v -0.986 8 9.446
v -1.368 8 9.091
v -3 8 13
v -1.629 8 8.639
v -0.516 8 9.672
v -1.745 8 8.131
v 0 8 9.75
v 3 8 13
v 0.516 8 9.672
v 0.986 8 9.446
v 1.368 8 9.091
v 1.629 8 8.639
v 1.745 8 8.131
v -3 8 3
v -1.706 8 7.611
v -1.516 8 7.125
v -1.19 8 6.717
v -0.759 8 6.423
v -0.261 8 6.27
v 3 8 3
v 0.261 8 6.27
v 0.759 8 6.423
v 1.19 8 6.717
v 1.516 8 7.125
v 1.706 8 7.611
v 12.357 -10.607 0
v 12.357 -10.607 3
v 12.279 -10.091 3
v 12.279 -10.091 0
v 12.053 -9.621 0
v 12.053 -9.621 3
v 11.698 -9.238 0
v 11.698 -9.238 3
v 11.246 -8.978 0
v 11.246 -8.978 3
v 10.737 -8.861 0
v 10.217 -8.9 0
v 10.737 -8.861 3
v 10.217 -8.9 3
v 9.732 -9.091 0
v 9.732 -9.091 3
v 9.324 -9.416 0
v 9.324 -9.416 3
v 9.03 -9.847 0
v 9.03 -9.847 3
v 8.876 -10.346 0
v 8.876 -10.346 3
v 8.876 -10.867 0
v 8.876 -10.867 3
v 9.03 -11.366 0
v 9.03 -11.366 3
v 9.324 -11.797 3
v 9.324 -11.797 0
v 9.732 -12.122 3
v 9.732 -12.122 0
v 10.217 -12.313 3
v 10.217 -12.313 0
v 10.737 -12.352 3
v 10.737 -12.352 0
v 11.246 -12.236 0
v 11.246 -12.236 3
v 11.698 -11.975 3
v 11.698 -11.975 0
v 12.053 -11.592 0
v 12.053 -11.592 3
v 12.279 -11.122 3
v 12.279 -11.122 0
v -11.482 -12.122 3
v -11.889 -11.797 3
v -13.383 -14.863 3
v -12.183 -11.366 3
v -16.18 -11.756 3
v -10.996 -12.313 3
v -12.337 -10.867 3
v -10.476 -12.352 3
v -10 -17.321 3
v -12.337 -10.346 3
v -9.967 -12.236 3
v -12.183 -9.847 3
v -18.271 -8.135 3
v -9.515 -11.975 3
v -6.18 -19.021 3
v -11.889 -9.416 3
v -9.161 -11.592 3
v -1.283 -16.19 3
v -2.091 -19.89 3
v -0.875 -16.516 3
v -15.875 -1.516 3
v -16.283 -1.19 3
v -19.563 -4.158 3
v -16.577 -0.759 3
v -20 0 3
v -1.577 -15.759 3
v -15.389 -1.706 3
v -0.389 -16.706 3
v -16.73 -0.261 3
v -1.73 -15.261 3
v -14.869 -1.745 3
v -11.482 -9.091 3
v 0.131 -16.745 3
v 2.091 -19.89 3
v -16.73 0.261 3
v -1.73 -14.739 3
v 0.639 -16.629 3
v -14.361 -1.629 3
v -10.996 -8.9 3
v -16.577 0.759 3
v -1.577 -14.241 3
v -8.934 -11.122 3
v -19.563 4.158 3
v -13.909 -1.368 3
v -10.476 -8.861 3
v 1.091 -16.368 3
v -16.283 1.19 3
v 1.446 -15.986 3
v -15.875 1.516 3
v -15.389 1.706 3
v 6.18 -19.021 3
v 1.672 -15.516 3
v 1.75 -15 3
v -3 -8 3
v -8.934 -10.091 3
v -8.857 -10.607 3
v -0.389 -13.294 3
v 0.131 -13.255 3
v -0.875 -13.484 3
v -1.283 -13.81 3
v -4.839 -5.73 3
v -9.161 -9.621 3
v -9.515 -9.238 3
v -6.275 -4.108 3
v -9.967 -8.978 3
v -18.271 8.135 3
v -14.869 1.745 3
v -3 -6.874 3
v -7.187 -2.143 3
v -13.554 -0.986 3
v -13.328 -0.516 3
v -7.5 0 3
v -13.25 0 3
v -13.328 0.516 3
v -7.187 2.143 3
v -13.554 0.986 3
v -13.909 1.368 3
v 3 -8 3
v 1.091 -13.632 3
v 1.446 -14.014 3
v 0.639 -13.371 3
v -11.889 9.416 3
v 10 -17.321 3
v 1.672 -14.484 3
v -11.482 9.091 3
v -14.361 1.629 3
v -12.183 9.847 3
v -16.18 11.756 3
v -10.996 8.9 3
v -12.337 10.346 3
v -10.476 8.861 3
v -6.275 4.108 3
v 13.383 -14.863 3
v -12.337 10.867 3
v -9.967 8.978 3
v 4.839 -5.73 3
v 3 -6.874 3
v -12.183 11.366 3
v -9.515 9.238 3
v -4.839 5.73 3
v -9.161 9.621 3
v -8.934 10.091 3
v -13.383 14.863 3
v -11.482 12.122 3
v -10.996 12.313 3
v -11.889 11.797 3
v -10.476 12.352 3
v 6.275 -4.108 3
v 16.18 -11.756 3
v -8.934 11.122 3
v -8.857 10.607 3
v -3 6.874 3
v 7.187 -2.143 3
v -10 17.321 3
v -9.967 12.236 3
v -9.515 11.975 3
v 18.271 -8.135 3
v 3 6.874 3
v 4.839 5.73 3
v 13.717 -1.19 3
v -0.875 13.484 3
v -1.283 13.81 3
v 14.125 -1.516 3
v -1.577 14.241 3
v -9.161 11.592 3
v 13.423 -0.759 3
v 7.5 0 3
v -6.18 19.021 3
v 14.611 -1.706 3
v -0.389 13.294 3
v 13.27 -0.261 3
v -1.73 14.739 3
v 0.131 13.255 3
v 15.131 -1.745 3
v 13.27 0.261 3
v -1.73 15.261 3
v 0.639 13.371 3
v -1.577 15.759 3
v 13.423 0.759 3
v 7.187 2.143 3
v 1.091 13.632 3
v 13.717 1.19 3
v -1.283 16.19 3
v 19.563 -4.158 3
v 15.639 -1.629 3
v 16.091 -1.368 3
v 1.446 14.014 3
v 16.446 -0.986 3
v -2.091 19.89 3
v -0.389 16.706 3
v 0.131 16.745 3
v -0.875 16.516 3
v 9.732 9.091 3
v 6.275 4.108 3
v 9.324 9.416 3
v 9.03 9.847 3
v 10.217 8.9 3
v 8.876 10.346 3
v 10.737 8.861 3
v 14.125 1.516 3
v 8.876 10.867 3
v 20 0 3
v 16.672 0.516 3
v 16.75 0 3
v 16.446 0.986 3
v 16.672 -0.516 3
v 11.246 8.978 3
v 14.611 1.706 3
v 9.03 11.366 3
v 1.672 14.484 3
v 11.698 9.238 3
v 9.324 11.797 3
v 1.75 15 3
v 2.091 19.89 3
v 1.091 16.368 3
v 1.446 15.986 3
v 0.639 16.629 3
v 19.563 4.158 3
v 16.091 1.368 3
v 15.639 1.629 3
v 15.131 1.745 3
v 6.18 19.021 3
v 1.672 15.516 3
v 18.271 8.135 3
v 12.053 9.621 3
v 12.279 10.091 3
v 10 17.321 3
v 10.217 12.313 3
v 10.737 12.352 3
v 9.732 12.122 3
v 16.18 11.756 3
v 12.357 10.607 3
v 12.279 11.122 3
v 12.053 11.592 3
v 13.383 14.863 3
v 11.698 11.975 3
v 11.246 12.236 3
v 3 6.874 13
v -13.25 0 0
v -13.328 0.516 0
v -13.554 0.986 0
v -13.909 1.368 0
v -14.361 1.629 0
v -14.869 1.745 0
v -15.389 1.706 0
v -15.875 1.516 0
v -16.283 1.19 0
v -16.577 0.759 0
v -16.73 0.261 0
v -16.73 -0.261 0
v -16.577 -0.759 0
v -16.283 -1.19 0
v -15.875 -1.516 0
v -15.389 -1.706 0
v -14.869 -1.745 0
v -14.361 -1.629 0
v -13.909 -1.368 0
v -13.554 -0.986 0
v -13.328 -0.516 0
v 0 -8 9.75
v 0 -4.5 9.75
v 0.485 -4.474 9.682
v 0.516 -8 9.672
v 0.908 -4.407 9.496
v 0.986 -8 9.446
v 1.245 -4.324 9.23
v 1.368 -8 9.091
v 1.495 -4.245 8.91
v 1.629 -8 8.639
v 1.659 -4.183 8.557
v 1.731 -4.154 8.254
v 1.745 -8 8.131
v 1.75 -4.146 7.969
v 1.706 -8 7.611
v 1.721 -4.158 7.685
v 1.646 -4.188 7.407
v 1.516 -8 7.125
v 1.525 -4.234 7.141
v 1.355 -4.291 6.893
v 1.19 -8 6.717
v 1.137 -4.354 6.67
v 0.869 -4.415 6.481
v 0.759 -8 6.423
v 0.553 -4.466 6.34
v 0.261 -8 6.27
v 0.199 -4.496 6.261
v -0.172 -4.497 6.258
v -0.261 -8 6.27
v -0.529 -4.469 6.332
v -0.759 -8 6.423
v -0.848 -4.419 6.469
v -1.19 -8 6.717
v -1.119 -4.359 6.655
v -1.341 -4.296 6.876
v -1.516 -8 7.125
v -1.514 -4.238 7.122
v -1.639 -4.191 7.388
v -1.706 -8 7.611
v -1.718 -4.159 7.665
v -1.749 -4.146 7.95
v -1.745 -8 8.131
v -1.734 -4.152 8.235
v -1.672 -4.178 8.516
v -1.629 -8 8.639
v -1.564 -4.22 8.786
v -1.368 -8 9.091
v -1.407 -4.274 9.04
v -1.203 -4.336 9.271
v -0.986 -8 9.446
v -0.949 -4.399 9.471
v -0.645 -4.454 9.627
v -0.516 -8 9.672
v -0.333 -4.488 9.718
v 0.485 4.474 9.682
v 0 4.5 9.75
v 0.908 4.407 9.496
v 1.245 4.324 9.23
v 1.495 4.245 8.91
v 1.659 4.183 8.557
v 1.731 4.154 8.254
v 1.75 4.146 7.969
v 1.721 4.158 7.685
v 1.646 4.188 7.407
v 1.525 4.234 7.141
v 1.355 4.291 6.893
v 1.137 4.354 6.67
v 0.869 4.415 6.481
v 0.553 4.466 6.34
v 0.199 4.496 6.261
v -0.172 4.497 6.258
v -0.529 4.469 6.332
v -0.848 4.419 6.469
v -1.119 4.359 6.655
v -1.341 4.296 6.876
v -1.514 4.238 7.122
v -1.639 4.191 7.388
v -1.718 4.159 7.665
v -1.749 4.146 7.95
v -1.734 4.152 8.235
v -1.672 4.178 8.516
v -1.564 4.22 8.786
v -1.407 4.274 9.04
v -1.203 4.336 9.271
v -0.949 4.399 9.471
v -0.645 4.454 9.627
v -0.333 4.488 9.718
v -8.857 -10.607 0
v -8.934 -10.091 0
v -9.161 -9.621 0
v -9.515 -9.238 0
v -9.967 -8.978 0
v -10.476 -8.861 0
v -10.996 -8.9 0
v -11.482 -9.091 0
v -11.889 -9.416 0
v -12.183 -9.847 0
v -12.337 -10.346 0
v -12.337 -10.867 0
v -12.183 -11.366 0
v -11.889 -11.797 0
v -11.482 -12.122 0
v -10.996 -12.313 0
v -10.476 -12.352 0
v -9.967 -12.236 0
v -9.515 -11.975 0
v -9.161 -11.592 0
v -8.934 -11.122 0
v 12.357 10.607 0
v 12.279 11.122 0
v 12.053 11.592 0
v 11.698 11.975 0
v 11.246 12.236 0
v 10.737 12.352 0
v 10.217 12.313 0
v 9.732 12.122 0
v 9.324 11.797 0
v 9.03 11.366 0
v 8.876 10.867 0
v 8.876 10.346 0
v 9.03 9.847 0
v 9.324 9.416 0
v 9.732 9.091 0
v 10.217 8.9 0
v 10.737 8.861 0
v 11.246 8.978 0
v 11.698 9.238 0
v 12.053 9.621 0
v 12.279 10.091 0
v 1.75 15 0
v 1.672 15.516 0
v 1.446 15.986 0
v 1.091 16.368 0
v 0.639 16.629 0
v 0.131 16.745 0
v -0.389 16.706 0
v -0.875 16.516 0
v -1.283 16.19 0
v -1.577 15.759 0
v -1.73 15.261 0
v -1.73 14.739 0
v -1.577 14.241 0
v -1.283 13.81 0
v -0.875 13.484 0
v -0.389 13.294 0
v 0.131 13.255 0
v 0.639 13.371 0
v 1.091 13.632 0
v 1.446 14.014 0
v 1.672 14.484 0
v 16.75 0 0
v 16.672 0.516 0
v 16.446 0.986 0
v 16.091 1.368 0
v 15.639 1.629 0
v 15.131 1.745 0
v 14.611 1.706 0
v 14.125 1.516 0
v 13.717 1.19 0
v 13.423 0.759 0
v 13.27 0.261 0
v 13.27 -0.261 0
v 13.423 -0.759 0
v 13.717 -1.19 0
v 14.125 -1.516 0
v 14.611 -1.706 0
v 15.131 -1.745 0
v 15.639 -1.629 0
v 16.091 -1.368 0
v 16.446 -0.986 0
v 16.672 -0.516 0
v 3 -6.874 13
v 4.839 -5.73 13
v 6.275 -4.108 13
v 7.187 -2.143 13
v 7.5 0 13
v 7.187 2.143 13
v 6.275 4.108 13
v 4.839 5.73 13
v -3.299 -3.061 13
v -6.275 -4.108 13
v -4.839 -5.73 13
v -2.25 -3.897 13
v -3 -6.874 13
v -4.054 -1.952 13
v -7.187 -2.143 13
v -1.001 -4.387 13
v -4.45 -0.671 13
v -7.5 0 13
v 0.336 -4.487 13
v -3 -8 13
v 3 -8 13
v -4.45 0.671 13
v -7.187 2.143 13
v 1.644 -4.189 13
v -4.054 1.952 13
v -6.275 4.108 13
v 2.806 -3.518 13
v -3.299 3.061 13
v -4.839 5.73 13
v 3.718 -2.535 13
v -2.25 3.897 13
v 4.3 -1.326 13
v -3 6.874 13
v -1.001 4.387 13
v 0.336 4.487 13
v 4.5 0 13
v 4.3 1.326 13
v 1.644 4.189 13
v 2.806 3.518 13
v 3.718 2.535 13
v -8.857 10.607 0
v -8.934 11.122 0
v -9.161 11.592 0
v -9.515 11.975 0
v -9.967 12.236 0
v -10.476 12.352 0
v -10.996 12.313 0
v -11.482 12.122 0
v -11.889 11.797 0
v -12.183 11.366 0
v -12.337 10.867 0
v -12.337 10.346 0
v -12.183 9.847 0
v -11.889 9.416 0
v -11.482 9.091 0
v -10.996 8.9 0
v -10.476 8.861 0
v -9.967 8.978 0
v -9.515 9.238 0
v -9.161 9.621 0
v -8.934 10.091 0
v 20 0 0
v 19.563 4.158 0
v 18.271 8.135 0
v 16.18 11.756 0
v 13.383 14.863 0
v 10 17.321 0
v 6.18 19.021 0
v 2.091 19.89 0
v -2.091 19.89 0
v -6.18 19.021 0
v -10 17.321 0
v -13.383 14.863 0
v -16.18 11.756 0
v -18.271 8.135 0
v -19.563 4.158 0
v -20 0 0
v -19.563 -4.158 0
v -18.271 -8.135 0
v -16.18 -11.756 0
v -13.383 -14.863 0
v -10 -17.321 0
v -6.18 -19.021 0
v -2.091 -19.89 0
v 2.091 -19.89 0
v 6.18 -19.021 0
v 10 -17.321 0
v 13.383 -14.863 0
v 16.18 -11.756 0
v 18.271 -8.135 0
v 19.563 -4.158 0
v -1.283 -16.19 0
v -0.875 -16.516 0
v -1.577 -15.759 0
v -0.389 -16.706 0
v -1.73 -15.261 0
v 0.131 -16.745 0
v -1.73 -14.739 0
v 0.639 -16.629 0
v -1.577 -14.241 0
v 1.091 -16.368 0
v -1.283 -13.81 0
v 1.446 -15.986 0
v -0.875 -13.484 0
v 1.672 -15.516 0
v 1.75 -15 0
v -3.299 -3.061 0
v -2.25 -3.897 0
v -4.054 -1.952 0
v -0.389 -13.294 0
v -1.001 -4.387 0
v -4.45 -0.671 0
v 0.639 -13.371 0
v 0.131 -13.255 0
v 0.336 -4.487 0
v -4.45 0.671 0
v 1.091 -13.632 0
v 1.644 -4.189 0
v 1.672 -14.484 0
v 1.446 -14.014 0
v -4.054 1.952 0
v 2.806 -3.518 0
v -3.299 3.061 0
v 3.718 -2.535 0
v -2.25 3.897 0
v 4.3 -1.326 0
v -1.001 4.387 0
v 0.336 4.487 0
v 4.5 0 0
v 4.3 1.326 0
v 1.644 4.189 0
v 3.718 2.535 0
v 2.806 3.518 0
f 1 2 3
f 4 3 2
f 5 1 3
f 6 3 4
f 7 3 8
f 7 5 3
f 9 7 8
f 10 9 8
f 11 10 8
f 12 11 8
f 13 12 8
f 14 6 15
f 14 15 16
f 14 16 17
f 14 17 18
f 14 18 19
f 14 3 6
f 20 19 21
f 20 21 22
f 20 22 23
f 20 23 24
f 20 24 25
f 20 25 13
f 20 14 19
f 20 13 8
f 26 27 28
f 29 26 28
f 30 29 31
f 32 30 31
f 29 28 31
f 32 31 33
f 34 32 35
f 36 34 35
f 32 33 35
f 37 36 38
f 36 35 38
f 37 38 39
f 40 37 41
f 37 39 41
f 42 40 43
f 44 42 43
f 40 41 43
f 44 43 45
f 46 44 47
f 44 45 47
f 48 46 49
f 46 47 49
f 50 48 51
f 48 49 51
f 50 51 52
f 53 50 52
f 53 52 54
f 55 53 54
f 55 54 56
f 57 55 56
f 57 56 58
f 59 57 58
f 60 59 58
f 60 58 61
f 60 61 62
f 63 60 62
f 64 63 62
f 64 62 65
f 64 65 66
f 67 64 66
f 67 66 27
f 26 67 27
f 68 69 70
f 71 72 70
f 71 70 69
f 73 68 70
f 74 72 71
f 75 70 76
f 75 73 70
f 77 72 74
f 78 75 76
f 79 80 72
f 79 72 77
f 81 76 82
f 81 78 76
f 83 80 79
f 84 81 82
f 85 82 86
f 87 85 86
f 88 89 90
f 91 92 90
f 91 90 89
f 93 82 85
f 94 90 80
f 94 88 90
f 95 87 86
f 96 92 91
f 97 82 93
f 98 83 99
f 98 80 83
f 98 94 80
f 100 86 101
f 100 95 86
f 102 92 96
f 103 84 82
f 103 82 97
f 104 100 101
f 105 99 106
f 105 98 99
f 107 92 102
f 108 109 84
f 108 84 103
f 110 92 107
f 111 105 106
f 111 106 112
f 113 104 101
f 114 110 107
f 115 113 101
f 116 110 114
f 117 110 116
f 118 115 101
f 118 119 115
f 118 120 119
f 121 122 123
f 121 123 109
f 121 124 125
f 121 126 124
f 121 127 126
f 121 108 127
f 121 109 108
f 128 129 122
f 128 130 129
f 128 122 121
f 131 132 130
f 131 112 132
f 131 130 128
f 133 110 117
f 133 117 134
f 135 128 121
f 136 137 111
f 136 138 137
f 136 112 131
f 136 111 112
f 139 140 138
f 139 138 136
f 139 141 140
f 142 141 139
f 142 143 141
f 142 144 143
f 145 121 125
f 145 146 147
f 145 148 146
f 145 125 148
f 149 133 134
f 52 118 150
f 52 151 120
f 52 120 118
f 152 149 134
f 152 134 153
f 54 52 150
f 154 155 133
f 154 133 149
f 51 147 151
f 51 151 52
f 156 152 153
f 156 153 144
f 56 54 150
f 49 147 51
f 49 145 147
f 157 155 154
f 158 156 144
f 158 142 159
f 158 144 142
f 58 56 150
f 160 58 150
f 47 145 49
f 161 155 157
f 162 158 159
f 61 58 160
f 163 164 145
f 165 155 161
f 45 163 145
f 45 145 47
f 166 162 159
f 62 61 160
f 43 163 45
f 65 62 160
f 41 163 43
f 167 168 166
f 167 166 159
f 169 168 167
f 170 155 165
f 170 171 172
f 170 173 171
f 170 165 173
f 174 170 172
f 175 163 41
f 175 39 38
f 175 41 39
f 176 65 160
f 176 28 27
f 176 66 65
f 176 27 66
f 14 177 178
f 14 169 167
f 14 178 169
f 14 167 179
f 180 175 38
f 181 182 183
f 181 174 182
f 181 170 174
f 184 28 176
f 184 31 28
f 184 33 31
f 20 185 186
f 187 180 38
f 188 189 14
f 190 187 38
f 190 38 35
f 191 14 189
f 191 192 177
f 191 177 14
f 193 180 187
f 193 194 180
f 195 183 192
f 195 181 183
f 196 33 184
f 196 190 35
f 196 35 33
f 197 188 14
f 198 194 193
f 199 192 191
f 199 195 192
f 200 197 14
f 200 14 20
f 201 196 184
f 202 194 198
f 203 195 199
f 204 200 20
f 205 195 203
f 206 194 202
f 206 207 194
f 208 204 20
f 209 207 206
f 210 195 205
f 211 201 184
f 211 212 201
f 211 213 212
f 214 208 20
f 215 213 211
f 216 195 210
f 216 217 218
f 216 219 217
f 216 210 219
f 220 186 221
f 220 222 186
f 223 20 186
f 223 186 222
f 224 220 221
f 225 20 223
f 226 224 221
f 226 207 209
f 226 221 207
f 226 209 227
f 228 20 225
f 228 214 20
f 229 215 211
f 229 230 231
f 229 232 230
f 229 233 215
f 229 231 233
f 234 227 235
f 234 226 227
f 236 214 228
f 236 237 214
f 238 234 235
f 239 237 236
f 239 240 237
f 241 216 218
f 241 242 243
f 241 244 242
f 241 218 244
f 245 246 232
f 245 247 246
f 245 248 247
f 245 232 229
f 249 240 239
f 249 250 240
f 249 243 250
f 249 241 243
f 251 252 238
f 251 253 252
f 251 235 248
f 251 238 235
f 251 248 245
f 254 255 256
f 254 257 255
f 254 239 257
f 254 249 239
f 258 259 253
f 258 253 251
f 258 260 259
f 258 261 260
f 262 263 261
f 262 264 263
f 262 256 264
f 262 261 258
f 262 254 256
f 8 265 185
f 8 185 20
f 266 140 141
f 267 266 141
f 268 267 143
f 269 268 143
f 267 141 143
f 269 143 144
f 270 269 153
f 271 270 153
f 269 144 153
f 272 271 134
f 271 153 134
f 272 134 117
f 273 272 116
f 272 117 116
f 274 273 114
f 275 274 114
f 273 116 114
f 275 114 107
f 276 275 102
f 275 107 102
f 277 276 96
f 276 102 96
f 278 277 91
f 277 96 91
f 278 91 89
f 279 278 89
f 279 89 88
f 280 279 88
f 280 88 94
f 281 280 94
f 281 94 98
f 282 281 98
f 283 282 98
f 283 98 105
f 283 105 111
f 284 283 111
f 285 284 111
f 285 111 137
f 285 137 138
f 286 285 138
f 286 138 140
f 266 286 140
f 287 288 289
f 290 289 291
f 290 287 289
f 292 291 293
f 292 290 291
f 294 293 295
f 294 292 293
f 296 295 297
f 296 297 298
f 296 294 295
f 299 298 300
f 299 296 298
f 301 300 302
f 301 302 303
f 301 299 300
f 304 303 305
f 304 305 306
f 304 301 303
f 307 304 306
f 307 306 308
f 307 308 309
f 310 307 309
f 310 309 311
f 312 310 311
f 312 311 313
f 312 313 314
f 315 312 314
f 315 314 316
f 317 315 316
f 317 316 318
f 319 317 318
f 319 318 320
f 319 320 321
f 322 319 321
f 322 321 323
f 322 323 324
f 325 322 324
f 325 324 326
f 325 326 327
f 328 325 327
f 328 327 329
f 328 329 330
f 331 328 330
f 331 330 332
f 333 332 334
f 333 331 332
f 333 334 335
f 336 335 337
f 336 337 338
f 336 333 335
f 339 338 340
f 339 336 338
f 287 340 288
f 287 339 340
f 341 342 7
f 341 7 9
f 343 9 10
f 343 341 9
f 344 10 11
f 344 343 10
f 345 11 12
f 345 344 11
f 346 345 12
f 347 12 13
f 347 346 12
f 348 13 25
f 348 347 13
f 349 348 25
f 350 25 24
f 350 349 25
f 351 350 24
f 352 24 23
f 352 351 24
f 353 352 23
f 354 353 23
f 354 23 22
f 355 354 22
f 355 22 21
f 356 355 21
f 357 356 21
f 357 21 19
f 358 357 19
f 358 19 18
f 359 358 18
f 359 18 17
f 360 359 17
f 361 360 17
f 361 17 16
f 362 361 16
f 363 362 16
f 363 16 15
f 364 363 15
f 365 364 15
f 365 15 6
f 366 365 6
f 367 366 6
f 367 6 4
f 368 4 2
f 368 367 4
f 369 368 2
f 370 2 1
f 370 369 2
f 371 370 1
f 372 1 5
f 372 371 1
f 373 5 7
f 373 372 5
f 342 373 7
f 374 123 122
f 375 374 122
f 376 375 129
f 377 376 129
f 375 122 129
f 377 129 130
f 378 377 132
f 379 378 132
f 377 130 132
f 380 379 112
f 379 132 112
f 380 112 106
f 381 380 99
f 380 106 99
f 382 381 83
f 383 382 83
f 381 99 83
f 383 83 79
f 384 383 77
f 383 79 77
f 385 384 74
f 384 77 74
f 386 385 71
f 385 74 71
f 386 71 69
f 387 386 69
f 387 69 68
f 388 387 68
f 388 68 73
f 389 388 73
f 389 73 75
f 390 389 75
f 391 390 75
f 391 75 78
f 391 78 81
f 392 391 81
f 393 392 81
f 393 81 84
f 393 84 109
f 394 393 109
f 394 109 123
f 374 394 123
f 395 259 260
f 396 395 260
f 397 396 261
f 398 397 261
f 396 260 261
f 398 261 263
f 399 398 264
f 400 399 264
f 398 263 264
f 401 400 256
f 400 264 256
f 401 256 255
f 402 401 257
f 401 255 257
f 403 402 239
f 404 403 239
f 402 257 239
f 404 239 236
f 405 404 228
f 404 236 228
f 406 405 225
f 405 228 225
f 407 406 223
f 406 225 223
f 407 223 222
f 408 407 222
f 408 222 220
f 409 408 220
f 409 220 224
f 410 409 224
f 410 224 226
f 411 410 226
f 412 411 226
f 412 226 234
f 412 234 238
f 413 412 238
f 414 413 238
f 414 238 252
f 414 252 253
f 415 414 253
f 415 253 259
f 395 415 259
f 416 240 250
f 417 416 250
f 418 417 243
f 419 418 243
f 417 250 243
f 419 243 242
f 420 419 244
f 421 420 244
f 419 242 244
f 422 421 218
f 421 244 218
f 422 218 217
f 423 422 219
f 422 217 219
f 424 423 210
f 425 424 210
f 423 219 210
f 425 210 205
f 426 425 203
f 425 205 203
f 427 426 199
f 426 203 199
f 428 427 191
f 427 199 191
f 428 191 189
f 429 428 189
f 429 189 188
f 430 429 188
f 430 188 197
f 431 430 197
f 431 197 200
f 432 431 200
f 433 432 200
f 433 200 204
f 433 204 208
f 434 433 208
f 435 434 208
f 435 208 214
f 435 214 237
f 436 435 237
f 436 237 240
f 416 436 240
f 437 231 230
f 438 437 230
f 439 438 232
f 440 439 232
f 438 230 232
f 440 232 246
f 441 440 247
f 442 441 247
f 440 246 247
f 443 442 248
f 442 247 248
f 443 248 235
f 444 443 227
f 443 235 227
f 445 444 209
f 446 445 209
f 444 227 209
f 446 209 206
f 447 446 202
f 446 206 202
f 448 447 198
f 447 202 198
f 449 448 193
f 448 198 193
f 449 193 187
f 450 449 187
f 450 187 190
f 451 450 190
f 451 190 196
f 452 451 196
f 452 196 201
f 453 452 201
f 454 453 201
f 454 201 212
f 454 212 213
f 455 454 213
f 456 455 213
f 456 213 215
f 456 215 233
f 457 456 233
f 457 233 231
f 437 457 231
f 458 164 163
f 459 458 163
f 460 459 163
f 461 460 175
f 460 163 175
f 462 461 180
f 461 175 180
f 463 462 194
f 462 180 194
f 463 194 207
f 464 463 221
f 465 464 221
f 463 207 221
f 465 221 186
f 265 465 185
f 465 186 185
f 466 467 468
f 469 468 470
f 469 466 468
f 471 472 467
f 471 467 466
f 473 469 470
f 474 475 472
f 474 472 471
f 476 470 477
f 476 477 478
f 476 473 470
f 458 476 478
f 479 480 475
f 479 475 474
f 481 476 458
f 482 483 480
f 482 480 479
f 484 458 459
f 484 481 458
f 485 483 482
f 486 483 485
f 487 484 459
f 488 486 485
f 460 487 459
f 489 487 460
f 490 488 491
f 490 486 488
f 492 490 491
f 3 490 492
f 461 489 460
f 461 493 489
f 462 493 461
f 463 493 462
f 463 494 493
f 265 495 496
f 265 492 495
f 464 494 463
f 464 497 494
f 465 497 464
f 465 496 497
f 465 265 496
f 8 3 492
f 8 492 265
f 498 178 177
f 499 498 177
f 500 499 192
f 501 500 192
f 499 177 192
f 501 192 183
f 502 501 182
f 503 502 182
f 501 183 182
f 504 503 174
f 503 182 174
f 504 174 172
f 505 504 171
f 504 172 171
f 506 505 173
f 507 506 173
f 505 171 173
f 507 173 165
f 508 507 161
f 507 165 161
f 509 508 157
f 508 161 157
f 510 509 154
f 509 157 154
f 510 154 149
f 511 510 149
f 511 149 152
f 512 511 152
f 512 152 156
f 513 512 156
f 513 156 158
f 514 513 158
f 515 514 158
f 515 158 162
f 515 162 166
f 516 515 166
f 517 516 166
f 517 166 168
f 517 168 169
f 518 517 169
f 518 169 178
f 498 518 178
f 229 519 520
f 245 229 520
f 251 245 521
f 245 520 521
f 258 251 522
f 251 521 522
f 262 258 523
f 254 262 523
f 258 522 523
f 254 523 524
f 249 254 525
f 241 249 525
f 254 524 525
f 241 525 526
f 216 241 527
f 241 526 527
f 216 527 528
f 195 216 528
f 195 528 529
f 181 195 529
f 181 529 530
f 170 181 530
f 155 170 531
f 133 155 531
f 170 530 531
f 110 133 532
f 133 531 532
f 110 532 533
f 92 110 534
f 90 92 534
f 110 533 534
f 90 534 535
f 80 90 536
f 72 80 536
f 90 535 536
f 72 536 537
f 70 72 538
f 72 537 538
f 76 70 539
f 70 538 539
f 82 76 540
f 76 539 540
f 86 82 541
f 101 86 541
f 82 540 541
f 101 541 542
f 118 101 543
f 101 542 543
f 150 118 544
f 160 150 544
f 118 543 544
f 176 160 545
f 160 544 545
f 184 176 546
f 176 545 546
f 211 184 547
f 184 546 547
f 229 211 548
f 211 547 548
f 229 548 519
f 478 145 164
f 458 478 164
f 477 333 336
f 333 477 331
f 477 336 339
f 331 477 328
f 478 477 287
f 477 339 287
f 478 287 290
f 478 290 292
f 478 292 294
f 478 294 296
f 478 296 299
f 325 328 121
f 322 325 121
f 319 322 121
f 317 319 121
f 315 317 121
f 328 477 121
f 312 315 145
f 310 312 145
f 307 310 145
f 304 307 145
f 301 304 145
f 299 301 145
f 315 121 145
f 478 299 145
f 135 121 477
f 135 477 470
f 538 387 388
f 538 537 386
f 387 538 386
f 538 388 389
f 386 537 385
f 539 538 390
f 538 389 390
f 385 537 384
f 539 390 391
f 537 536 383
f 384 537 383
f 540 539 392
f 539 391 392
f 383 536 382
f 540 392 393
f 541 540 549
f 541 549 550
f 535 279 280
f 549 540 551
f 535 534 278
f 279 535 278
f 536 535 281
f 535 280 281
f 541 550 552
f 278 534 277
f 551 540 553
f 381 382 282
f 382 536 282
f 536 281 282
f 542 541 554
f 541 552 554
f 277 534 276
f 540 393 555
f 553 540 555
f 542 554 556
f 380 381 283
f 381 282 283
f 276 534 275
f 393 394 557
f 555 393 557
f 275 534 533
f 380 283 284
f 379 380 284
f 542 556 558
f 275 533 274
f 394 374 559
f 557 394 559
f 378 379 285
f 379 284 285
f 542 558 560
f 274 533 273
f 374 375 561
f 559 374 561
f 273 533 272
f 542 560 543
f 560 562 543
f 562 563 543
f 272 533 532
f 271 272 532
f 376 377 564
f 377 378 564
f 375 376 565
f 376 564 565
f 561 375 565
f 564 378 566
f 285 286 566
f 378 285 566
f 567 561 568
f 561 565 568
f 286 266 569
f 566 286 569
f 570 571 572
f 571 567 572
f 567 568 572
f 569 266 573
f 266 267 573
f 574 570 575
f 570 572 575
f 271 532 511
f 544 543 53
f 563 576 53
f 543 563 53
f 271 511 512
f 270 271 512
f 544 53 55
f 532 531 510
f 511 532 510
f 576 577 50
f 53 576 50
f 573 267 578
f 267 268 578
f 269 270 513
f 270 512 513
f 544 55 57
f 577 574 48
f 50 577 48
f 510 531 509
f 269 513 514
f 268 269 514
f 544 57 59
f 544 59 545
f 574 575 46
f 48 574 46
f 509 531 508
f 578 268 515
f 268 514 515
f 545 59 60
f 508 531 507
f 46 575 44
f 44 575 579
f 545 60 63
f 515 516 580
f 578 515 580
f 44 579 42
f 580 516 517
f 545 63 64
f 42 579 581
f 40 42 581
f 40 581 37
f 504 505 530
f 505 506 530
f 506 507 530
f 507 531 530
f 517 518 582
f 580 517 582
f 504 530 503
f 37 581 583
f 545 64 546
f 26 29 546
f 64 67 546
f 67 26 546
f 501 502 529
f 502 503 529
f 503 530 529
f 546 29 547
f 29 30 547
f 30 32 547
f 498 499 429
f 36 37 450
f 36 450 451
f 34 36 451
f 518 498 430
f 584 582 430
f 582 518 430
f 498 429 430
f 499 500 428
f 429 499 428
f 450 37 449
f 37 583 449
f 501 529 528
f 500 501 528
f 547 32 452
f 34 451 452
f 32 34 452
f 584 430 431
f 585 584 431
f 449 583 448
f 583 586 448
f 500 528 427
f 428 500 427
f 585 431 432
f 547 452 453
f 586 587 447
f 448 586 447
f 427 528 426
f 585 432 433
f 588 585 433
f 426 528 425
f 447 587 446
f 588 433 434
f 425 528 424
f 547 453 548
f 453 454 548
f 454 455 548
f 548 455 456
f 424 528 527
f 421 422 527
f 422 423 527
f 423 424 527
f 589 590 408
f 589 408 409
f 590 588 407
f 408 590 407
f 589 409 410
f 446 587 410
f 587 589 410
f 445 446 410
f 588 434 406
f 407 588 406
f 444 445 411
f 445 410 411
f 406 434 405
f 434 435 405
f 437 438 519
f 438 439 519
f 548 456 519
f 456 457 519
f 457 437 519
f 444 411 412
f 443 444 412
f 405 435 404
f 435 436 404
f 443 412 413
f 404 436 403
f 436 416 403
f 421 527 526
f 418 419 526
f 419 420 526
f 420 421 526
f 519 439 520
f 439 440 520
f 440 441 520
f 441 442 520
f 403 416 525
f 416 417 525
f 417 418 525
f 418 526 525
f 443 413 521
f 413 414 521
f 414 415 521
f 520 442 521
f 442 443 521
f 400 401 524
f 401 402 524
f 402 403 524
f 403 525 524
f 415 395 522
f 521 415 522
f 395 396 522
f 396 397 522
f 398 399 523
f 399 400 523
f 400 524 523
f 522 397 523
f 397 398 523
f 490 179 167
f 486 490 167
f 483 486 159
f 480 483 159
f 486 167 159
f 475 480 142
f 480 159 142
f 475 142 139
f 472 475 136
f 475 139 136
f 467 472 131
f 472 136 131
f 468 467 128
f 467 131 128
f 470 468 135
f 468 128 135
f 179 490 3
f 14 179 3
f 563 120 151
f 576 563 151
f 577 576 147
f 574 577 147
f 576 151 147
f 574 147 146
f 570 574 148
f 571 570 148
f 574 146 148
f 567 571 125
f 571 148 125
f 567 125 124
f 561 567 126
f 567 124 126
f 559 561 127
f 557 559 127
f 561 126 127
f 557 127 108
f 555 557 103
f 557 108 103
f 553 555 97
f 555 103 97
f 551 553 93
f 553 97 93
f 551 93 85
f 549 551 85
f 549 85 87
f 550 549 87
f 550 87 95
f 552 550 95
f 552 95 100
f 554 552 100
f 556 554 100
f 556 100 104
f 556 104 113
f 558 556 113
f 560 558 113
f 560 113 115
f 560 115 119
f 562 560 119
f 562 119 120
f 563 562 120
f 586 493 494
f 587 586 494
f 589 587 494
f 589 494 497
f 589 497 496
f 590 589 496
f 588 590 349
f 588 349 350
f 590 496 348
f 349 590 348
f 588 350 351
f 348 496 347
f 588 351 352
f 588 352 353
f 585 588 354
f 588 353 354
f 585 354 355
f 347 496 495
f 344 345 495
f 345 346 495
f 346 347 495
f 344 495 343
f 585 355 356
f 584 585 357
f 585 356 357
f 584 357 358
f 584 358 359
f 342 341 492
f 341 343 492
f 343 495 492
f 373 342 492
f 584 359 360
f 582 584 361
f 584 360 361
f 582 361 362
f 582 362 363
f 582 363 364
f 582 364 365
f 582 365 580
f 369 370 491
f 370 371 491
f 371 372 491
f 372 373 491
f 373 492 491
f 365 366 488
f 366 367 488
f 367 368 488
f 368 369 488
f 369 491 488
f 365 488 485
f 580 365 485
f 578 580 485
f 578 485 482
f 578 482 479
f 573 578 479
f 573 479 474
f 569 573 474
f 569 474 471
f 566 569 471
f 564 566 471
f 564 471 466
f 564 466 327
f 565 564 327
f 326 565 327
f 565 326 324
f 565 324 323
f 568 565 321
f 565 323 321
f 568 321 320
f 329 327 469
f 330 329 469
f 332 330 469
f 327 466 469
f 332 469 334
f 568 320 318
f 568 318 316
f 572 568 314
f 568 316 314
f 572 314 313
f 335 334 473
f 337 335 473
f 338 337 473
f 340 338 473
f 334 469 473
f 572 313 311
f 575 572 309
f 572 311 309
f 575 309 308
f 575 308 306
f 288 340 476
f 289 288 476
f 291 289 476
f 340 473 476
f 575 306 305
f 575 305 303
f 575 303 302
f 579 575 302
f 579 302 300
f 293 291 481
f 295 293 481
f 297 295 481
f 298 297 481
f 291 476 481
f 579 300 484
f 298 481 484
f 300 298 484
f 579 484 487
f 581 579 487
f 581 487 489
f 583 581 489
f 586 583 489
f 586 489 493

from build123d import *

# Parameters (mm, degrees)
SKETCH1_R               = 20
BOSS_EXTRUDE1_DEPTH     = 3
SKETCH2_R               = 7.5
BOSS_EXTRUDE2_DEPTH     = 10
SKETCH6_W               = 6
SKETCH6_H               = 16
BOSS_EXTRUDE3_DEPTH     = 10
SKETCH3_R               = 4.5
CUT_EXTRUDE1_DEPTH      = 32.128764833
SKETCH4_R               = 1.75
CUT_EXTRUDE2_DEPTH      = 31
CUT_EXTRUDE3_DEPTH      = 32.128764833
CUT_EXTRUDE3_DEPTH_BACK = 32.128764833
SKETCH5_R               = 1.75


with BuildPart() as part:
    # Sketch1 → Boss-Extrude1 (new body)
    with BuildSketch(Plane.XY):
        Circle(SKETCH1_R)
    extrude(amount=BOSS_EXTRUDE1_DEPTH)

    # Sketch2 → Boss-Extrude2 (add)
    with BuildSketch(Plane.XY.offset(3)):
        Circle(SKETCH2_R)
    extrude(amount=BOSS_EXTRUDE2_DEPTH)

    # Sketch6 → Boss-Extrude3 (add)
    with BuildSketch(Plane.XY.offset(3)):
        Rectangle(SKETCH6_W, SKETCH6_H)
    extrude(amount=BOSS_EXTRUDE3_DEPTH)

    # Sketch3 → Cut-Extrude1 (cut, through all)
    with BuildSketch(Plane.XY.offset(13)):
        Circle(SKETCH3_R)
    extrude(amount=-CUT_EXTRUDE1_DEPTH, mode=Mode.SUBTRACT)

    # Sketch4 → Cut-Extrude2 (cut, through all)
    with BuildSketch(Plane.XY.offset(3)):
        with Locations((0, 15)):
            Circle(SKETCH4_R)
        with Locations((10.606601718, 10.606601718)):
            Circle(SKETCH4_R)
        with Locations((15, 0)):
            Circle(SKETCH4_R)
        with Locations((10.606601718, -10.606601718)):
            Circle(SKETCH4_R)
        with Locations((0, -15)):
            Circle(SKETCH4_R)
        with Locations((-10.606601718, -10.606601718)):
            Circle(SKETCH4_R)
        with Locations((-15, 0)):
            Circle(SKETCH4_R)
        with Locations((-10.606601718, 10.606601718)):
            Circle(SKETCH4_R)
    extrude(amount=-CUT_EXTRUDE2_DEPTH, mode=Mode.SUBTRACT)

    # Sketch5 → Cut-Extrude3 (cut, two sides: drawn at the far end of the back side and taken through both)
    with BuildSketch(Plane(origin=(0, 0, 0), x_dir=(1, 0, 0), z_dir=(0, 1, 0)).offset(-CUT_EXTRUDE3_DEPTH_BACK)):
        with Locations(Location((0, -8, 0), (0, 0, 270))):
            Circle(SKETCH5_R)
    extrude(amount=CUT_EXTRUDE3_DEPTH + CUT_EXTRUDE3_DEPTH_BACK, mode=Mode.SUBTRACT)


solid = part.part
